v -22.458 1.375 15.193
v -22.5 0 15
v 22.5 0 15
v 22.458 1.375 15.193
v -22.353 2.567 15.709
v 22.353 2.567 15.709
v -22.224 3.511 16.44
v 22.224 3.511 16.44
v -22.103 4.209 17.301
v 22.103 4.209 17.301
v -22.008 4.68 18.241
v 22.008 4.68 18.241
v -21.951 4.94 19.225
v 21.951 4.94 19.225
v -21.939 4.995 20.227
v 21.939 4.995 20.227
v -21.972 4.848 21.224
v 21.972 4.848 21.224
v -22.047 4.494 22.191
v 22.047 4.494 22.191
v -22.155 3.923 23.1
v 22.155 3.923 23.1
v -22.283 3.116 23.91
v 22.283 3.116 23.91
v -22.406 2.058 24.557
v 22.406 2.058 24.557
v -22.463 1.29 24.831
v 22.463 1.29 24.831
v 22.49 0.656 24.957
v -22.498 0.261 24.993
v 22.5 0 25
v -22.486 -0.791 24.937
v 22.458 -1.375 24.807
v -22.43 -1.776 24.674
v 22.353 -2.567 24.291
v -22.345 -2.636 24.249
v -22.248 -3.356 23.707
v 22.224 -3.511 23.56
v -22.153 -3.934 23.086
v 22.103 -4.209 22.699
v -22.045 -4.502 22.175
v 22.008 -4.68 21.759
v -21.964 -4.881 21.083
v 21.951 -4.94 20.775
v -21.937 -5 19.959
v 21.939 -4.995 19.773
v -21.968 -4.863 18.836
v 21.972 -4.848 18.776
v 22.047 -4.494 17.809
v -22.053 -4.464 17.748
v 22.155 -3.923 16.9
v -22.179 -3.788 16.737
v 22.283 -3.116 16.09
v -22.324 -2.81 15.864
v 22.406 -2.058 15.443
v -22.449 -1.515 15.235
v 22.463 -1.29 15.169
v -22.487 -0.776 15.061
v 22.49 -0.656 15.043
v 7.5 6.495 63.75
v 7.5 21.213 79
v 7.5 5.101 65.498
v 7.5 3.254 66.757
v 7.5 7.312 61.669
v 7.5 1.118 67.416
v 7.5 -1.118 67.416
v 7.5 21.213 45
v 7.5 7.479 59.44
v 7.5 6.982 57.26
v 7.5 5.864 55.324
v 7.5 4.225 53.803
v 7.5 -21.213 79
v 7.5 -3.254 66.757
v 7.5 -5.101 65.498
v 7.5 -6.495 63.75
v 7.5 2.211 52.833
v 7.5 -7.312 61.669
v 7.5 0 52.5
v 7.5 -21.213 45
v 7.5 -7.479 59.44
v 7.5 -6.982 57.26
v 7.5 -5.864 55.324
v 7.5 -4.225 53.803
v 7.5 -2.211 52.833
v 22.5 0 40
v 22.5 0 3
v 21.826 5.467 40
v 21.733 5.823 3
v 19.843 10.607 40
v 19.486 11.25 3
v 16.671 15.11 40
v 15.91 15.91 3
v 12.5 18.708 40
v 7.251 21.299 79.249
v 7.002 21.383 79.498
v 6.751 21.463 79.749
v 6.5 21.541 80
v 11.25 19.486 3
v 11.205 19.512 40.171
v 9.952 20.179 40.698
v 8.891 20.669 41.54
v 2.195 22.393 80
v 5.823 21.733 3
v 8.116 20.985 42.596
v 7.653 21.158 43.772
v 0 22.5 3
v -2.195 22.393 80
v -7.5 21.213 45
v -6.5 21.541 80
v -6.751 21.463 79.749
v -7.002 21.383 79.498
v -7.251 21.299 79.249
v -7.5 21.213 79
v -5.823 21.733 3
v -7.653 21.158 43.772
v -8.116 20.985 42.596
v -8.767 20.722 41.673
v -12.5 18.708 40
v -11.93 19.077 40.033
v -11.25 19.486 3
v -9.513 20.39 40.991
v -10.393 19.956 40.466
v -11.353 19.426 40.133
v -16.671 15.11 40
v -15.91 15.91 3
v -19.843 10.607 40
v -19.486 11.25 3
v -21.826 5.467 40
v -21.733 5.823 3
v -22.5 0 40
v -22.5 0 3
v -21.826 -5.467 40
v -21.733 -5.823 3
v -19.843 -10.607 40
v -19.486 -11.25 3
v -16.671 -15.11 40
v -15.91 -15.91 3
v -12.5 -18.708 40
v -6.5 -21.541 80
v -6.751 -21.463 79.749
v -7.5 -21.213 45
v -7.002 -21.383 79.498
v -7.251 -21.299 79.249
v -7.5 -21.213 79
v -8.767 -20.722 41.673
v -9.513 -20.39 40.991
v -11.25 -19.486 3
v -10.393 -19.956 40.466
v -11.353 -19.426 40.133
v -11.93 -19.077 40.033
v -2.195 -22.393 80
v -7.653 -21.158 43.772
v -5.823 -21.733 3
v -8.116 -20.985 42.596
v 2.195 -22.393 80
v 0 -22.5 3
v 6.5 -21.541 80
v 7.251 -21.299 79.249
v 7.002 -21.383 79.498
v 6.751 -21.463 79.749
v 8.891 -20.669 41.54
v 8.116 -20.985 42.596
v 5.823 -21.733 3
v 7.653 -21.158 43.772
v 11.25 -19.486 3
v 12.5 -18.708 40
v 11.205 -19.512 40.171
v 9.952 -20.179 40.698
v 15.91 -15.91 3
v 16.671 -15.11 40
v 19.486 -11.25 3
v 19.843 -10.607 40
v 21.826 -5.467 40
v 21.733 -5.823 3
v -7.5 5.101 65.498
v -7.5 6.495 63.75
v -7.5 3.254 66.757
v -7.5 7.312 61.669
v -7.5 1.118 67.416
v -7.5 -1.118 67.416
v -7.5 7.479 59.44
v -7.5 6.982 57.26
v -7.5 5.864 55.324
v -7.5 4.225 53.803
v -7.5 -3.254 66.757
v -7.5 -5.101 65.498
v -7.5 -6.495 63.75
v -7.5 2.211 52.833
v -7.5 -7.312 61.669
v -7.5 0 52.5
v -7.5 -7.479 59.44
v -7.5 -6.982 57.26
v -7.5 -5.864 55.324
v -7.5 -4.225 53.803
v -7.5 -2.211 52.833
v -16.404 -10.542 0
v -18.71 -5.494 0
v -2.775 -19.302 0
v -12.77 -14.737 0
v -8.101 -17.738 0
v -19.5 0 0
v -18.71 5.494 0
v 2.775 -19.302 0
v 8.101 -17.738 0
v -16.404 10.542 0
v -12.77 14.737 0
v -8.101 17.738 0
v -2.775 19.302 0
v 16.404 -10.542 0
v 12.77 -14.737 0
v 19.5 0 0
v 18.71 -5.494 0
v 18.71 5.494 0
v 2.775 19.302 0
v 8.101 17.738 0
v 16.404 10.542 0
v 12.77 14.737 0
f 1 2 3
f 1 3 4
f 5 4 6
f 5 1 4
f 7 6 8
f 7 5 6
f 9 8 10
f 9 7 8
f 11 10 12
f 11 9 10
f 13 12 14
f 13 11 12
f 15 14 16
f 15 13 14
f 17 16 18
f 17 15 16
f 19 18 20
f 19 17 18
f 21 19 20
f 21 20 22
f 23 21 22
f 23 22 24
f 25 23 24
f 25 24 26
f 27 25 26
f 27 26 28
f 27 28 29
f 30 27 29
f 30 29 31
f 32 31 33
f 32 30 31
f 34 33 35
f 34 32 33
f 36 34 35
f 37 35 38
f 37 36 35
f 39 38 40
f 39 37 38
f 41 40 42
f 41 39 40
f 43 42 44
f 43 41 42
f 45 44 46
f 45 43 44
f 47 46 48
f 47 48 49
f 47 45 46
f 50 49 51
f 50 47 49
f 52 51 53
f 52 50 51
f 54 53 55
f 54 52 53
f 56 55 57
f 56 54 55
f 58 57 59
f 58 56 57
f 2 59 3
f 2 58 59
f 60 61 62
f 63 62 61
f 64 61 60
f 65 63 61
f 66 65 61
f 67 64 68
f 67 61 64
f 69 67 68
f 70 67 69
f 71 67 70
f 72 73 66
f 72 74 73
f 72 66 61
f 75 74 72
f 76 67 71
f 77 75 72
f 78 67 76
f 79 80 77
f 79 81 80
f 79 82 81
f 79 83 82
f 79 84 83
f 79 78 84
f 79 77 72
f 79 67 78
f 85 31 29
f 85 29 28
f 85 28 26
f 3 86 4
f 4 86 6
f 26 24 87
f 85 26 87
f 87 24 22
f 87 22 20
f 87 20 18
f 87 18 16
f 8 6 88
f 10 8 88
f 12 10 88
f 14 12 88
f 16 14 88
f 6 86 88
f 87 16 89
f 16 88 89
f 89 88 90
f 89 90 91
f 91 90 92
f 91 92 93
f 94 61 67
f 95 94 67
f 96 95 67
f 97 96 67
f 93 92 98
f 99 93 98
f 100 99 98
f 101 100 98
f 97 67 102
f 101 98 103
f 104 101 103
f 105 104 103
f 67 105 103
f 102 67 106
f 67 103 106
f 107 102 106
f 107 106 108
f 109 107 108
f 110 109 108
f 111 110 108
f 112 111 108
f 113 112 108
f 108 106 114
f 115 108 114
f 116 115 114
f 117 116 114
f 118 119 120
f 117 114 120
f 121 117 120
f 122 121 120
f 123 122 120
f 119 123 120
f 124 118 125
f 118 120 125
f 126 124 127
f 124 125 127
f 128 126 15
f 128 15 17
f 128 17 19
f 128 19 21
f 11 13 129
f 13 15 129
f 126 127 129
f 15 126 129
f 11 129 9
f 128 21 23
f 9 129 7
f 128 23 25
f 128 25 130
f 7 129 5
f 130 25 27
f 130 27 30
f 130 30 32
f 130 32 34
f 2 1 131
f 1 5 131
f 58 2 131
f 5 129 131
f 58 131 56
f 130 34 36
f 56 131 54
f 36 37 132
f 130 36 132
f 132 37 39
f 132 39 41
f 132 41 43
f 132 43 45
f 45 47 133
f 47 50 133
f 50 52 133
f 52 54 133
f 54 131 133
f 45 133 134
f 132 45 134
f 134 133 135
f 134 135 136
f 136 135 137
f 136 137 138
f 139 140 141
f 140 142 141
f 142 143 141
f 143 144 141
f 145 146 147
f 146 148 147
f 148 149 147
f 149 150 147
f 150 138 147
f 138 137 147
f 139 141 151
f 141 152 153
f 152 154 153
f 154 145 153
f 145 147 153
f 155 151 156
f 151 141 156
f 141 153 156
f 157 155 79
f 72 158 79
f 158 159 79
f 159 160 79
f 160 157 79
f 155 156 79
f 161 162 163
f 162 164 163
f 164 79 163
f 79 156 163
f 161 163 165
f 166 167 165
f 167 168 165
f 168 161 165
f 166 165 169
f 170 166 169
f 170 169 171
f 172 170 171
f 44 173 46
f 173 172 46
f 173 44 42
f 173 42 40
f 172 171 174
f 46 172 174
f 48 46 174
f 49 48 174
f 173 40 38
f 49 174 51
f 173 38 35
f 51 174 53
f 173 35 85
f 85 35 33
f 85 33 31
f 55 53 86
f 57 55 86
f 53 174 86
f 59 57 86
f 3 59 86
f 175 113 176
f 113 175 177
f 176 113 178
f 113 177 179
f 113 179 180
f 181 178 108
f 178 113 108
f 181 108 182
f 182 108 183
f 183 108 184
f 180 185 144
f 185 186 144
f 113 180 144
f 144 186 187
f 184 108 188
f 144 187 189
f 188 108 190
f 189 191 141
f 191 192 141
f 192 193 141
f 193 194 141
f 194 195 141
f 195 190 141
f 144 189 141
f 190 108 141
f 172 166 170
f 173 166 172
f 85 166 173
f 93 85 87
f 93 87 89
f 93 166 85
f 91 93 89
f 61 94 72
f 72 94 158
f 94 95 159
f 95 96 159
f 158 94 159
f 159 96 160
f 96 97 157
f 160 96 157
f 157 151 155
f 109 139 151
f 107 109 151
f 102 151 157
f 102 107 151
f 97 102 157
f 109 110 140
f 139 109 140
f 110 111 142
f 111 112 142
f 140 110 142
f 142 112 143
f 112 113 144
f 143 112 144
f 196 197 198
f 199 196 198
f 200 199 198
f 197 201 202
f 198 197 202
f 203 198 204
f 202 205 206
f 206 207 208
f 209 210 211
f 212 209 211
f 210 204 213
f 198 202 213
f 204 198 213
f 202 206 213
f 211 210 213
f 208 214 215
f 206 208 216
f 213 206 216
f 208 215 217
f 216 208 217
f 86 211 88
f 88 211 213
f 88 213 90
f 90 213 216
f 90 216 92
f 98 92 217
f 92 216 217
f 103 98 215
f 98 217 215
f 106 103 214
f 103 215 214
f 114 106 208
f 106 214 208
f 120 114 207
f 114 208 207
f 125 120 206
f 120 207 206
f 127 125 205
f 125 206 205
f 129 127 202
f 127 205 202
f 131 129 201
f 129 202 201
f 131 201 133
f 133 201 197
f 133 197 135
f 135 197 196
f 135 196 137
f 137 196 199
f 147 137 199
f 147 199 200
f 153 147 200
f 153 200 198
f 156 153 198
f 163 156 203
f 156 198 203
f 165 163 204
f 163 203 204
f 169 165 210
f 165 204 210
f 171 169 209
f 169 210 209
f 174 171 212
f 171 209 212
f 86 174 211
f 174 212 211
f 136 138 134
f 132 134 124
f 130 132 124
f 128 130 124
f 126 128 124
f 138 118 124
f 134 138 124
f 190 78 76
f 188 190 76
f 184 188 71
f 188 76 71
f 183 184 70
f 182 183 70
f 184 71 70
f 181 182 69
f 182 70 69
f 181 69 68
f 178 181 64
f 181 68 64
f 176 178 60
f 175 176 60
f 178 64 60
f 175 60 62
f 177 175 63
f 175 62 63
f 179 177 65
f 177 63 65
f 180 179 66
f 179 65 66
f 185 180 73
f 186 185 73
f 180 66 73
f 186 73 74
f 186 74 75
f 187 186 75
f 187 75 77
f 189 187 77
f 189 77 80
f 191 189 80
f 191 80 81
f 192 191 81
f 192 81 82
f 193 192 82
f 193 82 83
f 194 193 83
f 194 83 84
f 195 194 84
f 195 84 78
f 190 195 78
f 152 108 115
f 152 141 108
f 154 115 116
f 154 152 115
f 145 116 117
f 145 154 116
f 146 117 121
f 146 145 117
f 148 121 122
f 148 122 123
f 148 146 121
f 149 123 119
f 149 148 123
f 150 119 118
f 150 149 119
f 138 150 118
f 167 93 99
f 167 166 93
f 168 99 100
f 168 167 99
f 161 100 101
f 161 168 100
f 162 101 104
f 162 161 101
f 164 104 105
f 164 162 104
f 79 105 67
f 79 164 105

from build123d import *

# Parameters (mm, degrees)
SKETCH_1_R               = 22.5
EXTRUDE_1_DEPTH          = 80
CUT_EXTRUDE_START        = -40
CUT_EXTRUDE_1_DEPTH      = 40
FILLET_1_R               = 5
SKETCH_3_R               = 7.5
CUT_EXTRUDE_2_DEPTH      = 89.352985385
CHAMFER_2_SIZE           = 1
CHAMFER_3_SIZE           = 3
CUT_EXTRUDE_3_DEPTH      = 87.095876934
CUT_EXTRUDE_3_DEPTH_BACK = 87.095876934
SKETCH_4_R               = 5


with BuildPart() as part:
    # Эскиз1 → Бобышка-Вытянуть1 (new body)
    with BuildSketch(Plane.XY):
        Circle(SKETCH_1_R)
    extrude(amount=EXTRUDE_1_DEPTH)

    # Эскиз2 → Вырез-Вытянуть1 (cut)
    with BuildSketch(Plane.XY.offset(80).offset(CUT_EXTRUDE_START)):
        with BuildLine():
            Line((7.5, 21.213203436), (7.5, -21.213203436))
            ThreePointArc((7.5, -21.213203436), (22.5, 0), (7.5, 21.213203436))
        make_face()
        with BuildLine():
            Line((-7.5, 21.213203436), (-7.5, -21.213203436))
            ThreePointArc((-7.5, -21.213203436), (-22.5, 0), (-7.5, 21.213203436))
        make_face()
    extrude(amount=CUT_EXTRUDE_1_DEPTH, mode=Mode.SUBTRACT)

    # Скругление1
    fillet_1_edges = [part.edges().sort_by_distance(p)[0] for p in [
        (-7.5, 0, 40),
        (7.5, 0, 40),
    ]]
    fillet(fillet_1_edges, radius=FILLET_1_R)

    # Эскиз3 → Вырез-Вытянуть2 (cut, through all)
    with BuildSketch(Plane(origin=(7.5, 0, 0), x_dir=(0, 0, -1), z_dir=(1, 0, 0))):
        with Locations((-60, 0)):
            Circle(SKETCH_3_R)
    extrude(amount=-CUT_EXTRUDE_2_DEPTH, mode=Mode.SUBTRACT)

    # Фаска2
    chamfer_2_edges = [part.edges().sort_by_distance(p)[0] for p in [
        (-7.5, 0, 80),
        (7.5, 0, 80),
    ]]
    chamfer(chamfer_2_edges, length=CHAMFER_2_SIZE)

    # Фаска3
    chamfer_3_edges = [part.edges().sort_by_distance(p)[0] for p in [
        (-22.5, 0, 0),
    ]]
    chamfer(chamfer_3_edges, length=CHAMFER_3_SIZE)

    # Эскиз4 → Вырез-Вытянуть3 (cut, two sides: drawn at the far end of the back side and taken through both)
    with BuildSketch(Plane(origin=(0, 0, 0), x_dir=(0, 0, -1), z_dir=(1, 0, 0)).offset(-CUT_EXTRUDE_3_DEPTH_BACK)):
        with Locations((-20, 0)):
            Circle(SKETCH_4_R)
    extrude(amount=CUT_EXTRUDE_3_DEPTH + CUT_EXTRUDE_3_DEPTH_BACK, mode=Mode.SUBTRACT)


solid = part.part
